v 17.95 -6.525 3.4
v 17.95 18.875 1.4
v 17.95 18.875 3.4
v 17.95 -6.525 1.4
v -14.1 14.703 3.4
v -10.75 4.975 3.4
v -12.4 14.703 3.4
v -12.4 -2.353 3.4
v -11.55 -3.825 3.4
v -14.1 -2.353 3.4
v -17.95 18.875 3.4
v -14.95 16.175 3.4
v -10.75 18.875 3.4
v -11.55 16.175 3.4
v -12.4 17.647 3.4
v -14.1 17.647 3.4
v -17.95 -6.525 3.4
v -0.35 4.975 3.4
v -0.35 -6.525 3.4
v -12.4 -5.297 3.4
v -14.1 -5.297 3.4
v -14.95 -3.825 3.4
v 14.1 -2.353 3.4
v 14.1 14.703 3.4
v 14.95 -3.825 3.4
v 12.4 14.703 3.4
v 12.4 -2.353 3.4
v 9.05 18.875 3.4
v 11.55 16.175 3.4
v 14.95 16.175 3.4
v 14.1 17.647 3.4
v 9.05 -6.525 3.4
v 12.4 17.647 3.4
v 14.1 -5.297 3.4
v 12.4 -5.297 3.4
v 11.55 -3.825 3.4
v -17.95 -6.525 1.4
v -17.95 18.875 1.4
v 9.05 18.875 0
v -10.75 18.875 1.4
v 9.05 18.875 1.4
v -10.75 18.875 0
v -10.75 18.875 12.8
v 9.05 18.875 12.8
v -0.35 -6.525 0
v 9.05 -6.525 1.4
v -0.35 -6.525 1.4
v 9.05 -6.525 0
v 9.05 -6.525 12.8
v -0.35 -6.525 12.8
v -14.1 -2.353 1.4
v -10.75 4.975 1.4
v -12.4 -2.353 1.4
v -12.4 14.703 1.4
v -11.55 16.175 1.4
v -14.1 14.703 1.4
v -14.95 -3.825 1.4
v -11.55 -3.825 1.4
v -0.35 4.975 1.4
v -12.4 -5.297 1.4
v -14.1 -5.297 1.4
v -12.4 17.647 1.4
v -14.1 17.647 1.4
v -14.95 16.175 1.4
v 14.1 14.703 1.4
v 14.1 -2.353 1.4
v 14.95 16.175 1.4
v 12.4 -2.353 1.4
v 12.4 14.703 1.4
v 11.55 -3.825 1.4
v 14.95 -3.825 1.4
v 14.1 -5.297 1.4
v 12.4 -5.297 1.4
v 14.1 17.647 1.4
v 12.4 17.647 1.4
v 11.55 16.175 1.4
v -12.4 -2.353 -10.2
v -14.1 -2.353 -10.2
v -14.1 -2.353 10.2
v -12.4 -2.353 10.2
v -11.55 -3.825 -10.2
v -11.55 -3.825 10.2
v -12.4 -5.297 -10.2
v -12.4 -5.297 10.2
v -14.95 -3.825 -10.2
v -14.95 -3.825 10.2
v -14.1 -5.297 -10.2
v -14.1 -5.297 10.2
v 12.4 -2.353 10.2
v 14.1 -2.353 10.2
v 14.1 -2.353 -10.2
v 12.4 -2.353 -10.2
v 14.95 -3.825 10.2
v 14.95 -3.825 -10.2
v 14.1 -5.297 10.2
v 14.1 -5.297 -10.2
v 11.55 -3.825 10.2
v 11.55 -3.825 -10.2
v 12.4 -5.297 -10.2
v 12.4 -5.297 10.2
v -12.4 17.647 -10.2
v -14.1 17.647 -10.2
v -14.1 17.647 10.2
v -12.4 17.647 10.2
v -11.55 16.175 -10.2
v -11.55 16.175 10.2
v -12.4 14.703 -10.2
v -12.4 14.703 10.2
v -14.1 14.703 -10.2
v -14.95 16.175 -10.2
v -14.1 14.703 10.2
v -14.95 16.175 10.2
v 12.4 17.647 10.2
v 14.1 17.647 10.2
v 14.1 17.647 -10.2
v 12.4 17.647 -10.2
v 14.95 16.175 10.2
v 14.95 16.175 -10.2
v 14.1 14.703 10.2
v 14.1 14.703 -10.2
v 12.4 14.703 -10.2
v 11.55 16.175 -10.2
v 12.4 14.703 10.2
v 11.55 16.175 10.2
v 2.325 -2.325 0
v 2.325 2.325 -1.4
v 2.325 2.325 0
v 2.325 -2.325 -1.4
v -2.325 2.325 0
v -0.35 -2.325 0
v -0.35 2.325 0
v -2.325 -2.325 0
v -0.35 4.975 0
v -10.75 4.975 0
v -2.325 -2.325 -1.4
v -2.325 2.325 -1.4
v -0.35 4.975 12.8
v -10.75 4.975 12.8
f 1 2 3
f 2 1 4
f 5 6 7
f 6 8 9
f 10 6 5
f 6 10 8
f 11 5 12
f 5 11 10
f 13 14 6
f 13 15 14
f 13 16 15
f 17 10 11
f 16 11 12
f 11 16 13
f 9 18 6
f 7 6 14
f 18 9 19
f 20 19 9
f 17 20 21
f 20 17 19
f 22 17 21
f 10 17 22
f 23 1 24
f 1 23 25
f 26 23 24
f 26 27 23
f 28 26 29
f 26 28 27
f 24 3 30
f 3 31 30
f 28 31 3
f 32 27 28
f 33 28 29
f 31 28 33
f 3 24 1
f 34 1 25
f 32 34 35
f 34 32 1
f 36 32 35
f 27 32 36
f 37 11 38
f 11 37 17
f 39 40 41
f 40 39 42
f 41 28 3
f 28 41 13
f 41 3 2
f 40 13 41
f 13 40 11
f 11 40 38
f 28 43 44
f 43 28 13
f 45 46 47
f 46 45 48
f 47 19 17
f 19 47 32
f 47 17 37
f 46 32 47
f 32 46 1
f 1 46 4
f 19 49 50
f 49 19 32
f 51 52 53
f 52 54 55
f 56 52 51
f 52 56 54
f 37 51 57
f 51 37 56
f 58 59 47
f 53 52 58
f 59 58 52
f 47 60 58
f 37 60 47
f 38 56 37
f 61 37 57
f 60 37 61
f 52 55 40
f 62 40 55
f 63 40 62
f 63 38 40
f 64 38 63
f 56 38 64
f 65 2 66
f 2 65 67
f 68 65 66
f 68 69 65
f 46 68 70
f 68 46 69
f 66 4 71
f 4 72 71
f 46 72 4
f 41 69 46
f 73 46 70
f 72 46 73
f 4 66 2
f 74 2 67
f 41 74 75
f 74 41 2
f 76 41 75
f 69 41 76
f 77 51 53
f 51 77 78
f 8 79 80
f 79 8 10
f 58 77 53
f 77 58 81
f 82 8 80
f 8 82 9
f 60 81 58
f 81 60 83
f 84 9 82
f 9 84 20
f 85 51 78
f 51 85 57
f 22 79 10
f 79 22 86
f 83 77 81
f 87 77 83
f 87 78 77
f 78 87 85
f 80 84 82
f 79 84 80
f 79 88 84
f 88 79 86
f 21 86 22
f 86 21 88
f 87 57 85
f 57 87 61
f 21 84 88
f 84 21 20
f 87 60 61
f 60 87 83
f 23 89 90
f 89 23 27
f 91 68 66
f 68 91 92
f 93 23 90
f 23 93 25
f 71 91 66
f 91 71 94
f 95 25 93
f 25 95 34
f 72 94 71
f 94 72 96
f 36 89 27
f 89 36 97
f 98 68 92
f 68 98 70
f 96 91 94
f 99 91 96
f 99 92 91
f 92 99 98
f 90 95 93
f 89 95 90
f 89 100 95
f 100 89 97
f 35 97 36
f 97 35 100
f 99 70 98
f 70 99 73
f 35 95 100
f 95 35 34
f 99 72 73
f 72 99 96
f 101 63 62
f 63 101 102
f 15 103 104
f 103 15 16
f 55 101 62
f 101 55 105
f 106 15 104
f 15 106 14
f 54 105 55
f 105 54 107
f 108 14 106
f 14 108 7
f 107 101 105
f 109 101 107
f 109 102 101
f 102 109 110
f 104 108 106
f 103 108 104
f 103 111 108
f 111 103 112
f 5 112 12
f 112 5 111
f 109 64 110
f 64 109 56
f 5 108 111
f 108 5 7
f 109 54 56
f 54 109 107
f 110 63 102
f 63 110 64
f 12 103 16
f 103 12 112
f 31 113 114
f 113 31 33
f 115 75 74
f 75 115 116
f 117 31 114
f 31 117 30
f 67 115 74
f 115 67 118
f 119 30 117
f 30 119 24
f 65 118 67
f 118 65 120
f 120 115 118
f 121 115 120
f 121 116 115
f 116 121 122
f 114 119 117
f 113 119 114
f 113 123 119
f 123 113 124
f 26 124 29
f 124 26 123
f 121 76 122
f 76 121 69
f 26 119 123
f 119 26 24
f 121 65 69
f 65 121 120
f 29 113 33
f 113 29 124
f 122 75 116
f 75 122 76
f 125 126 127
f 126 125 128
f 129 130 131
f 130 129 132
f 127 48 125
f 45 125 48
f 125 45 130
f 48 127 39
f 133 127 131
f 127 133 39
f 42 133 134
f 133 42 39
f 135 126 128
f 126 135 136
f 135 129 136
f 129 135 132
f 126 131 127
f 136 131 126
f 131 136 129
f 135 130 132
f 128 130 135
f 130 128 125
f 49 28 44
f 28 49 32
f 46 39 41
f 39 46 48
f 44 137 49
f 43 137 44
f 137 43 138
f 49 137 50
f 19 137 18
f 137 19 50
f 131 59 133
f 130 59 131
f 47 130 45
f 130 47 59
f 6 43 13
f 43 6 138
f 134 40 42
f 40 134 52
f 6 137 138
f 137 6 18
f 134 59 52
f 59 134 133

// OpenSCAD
// file: ../../Fasteners/Screws/High_Low_Screw_Vitamin.scad
function HiLoScrewDiameter(3dPrinterTolerance=.4)= 3.6+3dPrinterTolerance;  
function HiLoScrewLength(3dPrinterTolerance=.4)= 22+3dPrinterTolerance;
function HiLoScrewHeadDiameter(3dPrinterTolerance=.4)= 6.7+3dPrinterTolerance;
function HiLoScrewHeadHeight(3dPrinterTolerance=.4)= 2.5+3dPrinterTolerance;

//err on the side of smaller tolerances for screws

module HiLoScrew(3dPrinterTolerance=.4)
{
	union()
	{
		translate([0,0,-HiLoScrewLength(3dPrinterTolerance)])
		{
			cylinder(HiLoScrewLength(3dPrinterTolerance), HiLoScrewDiameter(3dPrinterTolerance)/2, HiLoScrewDiameter(3dPrinterTolerance)/2);
		}
		cylinder(HiLoScrewHeadHeight(3dPrinterTolerance), HiLoScrewHeadDiameter(3dPrinterTolerance)/2,HiLoScrewHeadDiameter(3dPrinterTolerance)/2);
	}
}

HiLoScrew();
// main file
use <../../Fasteners/Screws/High_Low_Screw_Vitamin.scad>

function EncoderWidth(3dPrinterTolerance=.4)=35.5+ 3dPrinterTolerance;
function EncoderHeight(3dPrinterTolerance=.4)=25+ 3dPrinterTolerance;
function EncoderThickness(3dPrinterTolerance=.4)=3+ 3dPrinterTolerance;

function EncoderBoltWidth(3dPrinterTolerance=.4)=3+ 3dPrinterTolerance;
function EncoderBoltLength(3dPrinterTolerance=.4)=20+ 3dPrinterTolerance;
function EncoderBoltInsetY(3dPrinterTolerance=.4)=2.5+ 3dPrinterTolerance/2;
function EncoderBoltInsetX(3dPrinterTolerance=.4)=4.5+ 3dPrinterTolerance/2;

function EncoderLongBoxWidth(3dPrinterTolerance=.4)=9+ 3dPrinterTolerance;

function EncoderShortBoxWidth(3dPrinterTolerance=.4)=10+ 3dPrinterTolerance;
function EncoderShortBoxLength(3dPrinterTolerance=.4)=13.5+ 3dPrinterTolerance;
function EncoderShortBoxInset(3dPrinterTolerance=.4)=7+ 3dPrinterTolerance/2;

function EncoderBoxHeight(3dPrinterTolerance=.4)=9+EncoderThickness()+ 3dPrinterTolerance;

function EncoderChipSide(3dPrinterTolerance=.4)=4.25+ 3dPrinterTolerance;
function EncoderChipHeight(3dPrinterTolerance=.4)= 1+ 3dPrinterTolerance;
function EncoderChipOffset(3dPrinterTolerance=.4)=4+ 3dPrinterTolerance/2;

//this sort of forces the HiLo screw down so it is closer to the encoder and the encoder doesn't wiggle as much, feel free to change to 0 if you don't want it.
function HiLoOffset()=1.5;

module Encoder(Bolts=true, 3dPrinterTolerance=.4)
{
	//centers the encoder on the chip, which is the important part
	translate([-EncoderWidth(3dPrinterTolerance)/2,-EncoderChipOffset(3dPrinterTolerance)-EncoderChipSide(3dPrinterTolerance)/2,0])
	{
		union()
		{
	//base
			difference(){
				cube([EncoderWidth(3dPrinterTolerance), 
				      EncoderHeight(3dPrinterTolerance), 
				      EncoderThickness(3dPrinterTolerance)]);
				union(){
					
					cube([EncoderWidth(3dPrinterTolerance),
					      EncoderHeight(3dPrinterTolerance), 
					      EncoderThickness(3dPrinterTolerance)-1.6-3dPrinterTolerance]);
				}
			}
	//chip
			translate([EncoderWidth(3dPrinterTolerance)/2-EncoderChipSide(3dPrinterTolerance)/2, EncoderChipOffset(3dPrinterTolerance), -EncoderChipHeight(3dPrinterTolerance)])
			{
				cube([EncoderChipSide(3dPrinterTolerance), EncoderChipSide(3dPrinterTolerance),EncoderChipHeight(3dPrinterTolerance)]);
			}
	//boxes
			translate([EncoderShortBoxInset(3dPrinterTolerance)+EncoderShortBoxWidth(3dPrinterTolerance),0,0])
			{
				cube([EncoderLongBoxWidth(3dPrinterTolerance), EncoderHeight(3dPrinterTolerance), EncoderBoxHeight(3dPrinterTolerance)]);
			}
			translate([EncoderShortBoxInset(3dPrinterTolerance),EncoderHeight(3dPrinterTolerance)-EncoderShortBoxLength(3dPrinterTolerance),0])
			{ 
				cube([EncoderShortBoxWidth(3dPrinterTolerance), EncoderShortBoxLength(3dPrinterTolerance), EncoderBoxHeight(3dPrinterTolerance)]);
			}
if(Bolts==true)
	{
	//screws
			translate([EncoderBoltInsetX(3dPrinterTolerance),EncoderBoltInsetY(3dPrinterTolerance),-EncoderBoltLength(3dPrinterTolerance)/2])
			{
				cylinder(EncoderBoltLength(3dPrinterTolerance), EncoderBoltWidth(3dPrinterTolerance)/2, EncoderBoltWidth(3dPrinterTolerance)/2);
			}
			translate([EncoderWidth(3dPrinterTolerance)-EncoderBoltInsetX(3dPrinterTolerance),EncoderBoltInsetY(3dPrinterTolerance),-EncoderBoltLength(3dPrinterTolerance)/2])
			{
				cylinder(EncoderBoltLength(3dPrinterTolerance), EncoderBoltWidth(3dPrinterTolerance)/2, EncoderBoltWidth(3dPrinterTolerance)/2);
			}
			translate([EncoderBoltInsetX(3dPrinterTolerance),EncoderHeight(3dPrinterTolerance)-EncoderBoltInsetY(3dPrinterTolerance),-EncoderBoltLength(3dPrinterTolerance)/2])
			{
				cylinder(EncoderBoltLength(3dPrinterTolerance), EncoderBoltWidth(3dPrinterTolerance)/2, EncoderBoltWidth(3dPrinterTolerance)/2);
			}
			translate([EncoderWidth(3dPrinterTolerance)-EncoderBoltInsetX(3dPrinterTolerance),EncoderHeight(3dPrinterTolerance)-EncoderBoltInsetY(3dPrinterTolerance),-EncoderBoltLength(3dPrinterTolerance)/2])
			{
				cylinder(EncoderBoltLength(3dPrinterTolerance), EncoderBoltWidth(3dPrinterTolerance)/2, EncoderBoltWidth(3dPrinterTolerance)/2);
			}
	}else{}
		}
	}
}

//This is the encoder, complete with its encoder bolts (though bolts can be removed by changing the boolean to "false". It is shown in red.
translate([0,0,0])
{
	//color("Red")
	Encoder(true);
}


module Encoder_Keepaway(HiLo=true, 3dPrinterTolerance=.4)
{
	translate([.92,.92,0]){
		union()
		{
			Encoder(3dPrinterTolerance);
			translate([-EncoderWidth(3dPrinterTolerance)/2, -EncoderHeight(3dPrinterTolerance)+EncoderChipOffset(3dPrinterTolerance), 0])
			{
				cube([EncoderWidth(3dPrinterTolerance),EncoderThickness(3dPrinterTolerance)*8, EncoderThickness(3dPrinterTolerance)]);
			}
			translate([-(EncoderLongBoxWidth(3dPrinterTolerance)+EncoderShortBoxWidth(3dPrinterTolerance))/2-1,-(EncoderHeight(3dPrinterTolerance)+EncoderThickness(3dPrinterTolerance)*8)/2-1,0])
			{
				cube([EncoderLongBoxWidth(3dPrinterTolerance)+EncoderShortBoxWidth(3dPrinterTolerance)+1,EncoderHeight(3dPrinterTolerance)+EncoderThickness(3dPrinterTolerance)*16,EncoderHeight(3dPrinterTolerance)]);
			}
			//screws
			if(HiLo==true)
			{
				translate([-EncoderWidth()/2+EncoderThickness(),
				           -(-EncoderChipOffset(3dPrinterTolerance)-EncoderThickness(3dPrinterTolerance)*2.5-3dPrinterTolerance+HiLoOffset()),
				           EncoderBoltLength(3dPrinterTolerance)/2])
	
				{
					HiLoScrew(3dPrinterTolerance-.5);
				}
				translate([EncoderWidth()/2-EncoderThickness(),
				           -(-EncoderChipOffset(3dPrinterTolerance)-EncoderThickness(3dPrinterTolerance)*2.5-3dPrinterTolerance+HiLoOffset()),
				           
				           EncoderBoltLength(3dPrinterTolerance)/2])		
				{
					HiLoScrew(3dPrinterTolerance-.5);
				}
			}else{}
		}
	}
}

//This is the encoder with a keepaway, this is done so that you can fit the encoder into a slot, and use HiLo screws to hold it in, rather than purchasing the specific encoder bolts.
translate([50,0,0])
{
	union()
	{
		//Encoder(false);
		//%Encoder_Keepaway(true);
	}
}
